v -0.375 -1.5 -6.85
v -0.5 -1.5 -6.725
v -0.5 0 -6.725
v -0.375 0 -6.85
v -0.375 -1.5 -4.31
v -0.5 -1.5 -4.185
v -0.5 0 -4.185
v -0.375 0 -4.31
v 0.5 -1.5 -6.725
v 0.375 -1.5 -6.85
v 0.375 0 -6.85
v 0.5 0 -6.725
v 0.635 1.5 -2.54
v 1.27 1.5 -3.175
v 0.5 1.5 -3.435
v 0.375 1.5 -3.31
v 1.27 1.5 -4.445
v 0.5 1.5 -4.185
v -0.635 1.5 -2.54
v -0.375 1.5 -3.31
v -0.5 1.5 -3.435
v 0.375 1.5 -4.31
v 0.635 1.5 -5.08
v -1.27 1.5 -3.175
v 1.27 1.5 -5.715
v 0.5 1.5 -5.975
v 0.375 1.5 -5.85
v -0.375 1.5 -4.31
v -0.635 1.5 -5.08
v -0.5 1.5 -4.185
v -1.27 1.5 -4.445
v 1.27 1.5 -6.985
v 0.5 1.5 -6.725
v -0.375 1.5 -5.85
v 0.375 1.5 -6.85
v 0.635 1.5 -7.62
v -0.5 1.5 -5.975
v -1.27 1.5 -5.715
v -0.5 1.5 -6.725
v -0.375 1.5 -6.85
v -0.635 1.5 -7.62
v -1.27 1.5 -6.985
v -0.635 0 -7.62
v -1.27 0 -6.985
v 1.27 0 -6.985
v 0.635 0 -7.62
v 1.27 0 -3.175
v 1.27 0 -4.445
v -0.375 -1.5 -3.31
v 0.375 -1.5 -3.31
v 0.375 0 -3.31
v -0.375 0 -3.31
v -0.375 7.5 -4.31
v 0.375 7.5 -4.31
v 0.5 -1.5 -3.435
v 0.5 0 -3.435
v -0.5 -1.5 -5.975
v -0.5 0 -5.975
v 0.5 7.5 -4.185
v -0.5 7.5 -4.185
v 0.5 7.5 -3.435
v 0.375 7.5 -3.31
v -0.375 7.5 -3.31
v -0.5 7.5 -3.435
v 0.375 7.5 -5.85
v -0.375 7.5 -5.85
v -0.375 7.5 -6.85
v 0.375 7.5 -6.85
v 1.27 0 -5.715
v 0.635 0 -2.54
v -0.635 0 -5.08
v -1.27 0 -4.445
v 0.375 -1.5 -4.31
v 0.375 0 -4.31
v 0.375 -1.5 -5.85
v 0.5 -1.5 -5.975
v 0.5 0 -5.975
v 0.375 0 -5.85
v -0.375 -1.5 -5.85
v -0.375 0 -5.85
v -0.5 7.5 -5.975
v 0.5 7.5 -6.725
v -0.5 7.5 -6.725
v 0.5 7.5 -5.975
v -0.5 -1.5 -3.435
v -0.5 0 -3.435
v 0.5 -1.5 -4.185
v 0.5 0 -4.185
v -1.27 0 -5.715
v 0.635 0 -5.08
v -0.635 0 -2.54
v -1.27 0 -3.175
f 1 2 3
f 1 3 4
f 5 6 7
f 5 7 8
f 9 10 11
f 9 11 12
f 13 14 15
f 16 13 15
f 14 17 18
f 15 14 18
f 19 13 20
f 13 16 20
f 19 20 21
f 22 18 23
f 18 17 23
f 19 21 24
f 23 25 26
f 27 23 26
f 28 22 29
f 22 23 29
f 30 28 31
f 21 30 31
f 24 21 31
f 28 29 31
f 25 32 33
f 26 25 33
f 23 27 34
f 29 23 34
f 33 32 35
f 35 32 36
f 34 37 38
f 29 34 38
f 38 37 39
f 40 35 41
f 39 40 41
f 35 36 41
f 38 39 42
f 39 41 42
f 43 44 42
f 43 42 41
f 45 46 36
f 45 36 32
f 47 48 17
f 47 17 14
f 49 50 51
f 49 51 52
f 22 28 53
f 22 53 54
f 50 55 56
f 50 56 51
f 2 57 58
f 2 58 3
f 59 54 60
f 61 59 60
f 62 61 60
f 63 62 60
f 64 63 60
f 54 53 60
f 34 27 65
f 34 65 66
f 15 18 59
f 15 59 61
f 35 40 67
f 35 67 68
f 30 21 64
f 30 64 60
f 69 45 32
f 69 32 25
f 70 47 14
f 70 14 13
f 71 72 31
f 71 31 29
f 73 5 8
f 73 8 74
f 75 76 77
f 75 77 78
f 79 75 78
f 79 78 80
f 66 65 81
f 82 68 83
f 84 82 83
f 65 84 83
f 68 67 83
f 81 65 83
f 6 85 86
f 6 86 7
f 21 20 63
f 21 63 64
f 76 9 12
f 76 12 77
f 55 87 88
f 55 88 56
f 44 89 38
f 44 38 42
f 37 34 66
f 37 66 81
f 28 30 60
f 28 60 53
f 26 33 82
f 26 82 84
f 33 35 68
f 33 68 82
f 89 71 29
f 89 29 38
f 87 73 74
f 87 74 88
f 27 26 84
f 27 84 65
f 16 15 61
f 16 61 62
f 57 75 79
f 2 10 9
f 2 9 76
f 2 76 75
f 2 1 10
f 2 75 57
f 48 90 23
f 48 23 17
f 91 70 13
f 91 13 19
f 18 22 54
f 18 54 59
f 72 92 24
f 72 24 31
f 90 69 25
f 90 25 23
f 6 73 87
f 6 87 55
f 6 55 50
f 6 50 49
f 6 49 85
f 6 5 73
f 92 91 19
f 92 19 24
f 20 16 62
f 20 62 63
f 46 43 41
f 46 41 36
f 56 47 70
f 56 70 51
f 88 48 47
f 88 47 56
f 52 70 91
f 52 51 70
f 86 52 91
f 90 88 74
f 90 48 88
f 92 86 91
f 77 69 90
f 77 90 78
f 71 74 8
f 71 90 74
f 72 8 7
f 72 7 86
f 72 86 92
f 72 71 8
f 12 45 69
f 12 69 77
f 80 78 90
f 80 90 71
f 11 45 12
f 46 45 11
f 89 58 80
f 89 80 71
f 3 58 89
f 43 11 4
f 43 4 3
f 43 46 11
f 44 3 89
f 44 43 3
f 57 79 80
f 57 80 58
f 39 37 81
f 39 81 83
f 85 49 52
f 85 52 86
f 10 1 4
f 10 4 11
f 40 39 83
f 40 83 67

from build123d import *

# Parameters (mm, degrees)
BOSS_EXTRUDE1_DEPTH      = 1.5
BOSS_EXTRUDE2_DEPTH      = 6
BOSS_EXTRUDE2_DEPTH_BACK = 3
CUT_EXTRUDE1_DEPTH       = 13.69206445
CUT_EXTRUDE1_DEPTH_BACK  = 13.69206445
CUT_EXTRUDE2_DEPTH       = 6
CUT_EXTRUDE2_DEPTH_BACK  = 6


with BuildPart() as part:
    # Sketch1 → Boss-Extrude1 (new body)
    with BuildSketch(Plane(origin=(0, 0, 0), x_dir=(1, 0, 0), z_dir=(0, 1, 0))):
        Polygon((-0.635, 10.16), (0.635, 10.16), (1.27, 9.525), (1.27, 8.255), (0.635, 7.62), (1.27, 6.985), (1.27, 5.715), (0.635, 5.08), (1.27, 4.445), (1.27, 3.175), (0.635, 2.54), (1.27, 1.905), (1.27, 0.635), (0.635, 0), (1.27, -0.635), (1.27, -1.905), (0.635, -2.54), (1.27, -3.175), (1.27, -4.445), (0.635, -5.08), (-0.635, -5.08), (-1.27, -4.445), (-1.27, -3.175), (-0.635, -2.54), (-1.27, -1.905), (-1.27, -0.635), (-0.635, 0), (-1.27, 0.635), (-1.27, 1.905), (-0.635, 2.54), (-1.27, 3.175), (-1.27, 4.445), (-0.635, 5.08), (-1.27, 5.715), (-1.27, 6.985), (-0.635, 7.62), (-1.27, 8.255), (-1.27, 9.525), align=None)
    extrude(amount=BOSS_EXTRUDE1_DEPTH)

    # Sketch3 → Boss-Extrude2 (add, two sides: drawn at the far end of the back side and taken through both)
    with BuildSketch(Plane(origin=(0, 1.5, 0), x_dir=(1, 0, 0), z_dir=(0, 1, 0)).offset(-BOSS_EXTRUDE2_DEPTH_BACK)):
        Polygon((0.375, 9.39), (0.5, 9.265), (0.5, 8.515), (0.375, 8.39), (-0.375, 8.39), (-0.5, 8.515), (-0.5, 9.265), (-0.375, 9.39), align=None)
        Polygon((0.375, 6.85), (0.5, 6.725), (0.5, 5.975), (0.375, 5.85), (-0.375, 5.85), (-0.5, 5.975), (-0.5, 6.725), (-0.375, 6.85), align=None)
        Polygon((0.375, 4.31), (0.5, 4.185), (0.5, 3.435), (0.375, 3.31), (-0.375, 3.31), (-0.5, 3.435), (-0.5, 4.185), (-0.375, 4.31), align=None)
        Polygon((0.375, 1.77), (0.5, 1.645), (0.5, 0.895), (0.375, 0.77), (-0.375, 0.77), (-0.5, 0.895), (-0.5, 1.645), (-0.375, 1.77), align=None)
        Polygon((0.375, -0.77), (0.5, -0.895), (0.5, -1.645), (0.375, -1.77), (-0.375, -1.77), (-0.5, -1.645), (-0.5, -0.895), (-0.375, -0.77), align=None)
        Polygon((0.375, -3.31), (0.5, -3.435), (0.5, -4.185), (0.375, -4.31), (-0.375, -4.31), (-0.5, -4.185), (-0.5, -3.435), (-0.375, -3.31), align=None)
    extrude(amount=BOSS_EXTRUDE2_DEPTH + BOSS_EXTRUDE2_DEPTH_BACK)

    # Sketch4 → Cut-Extrude1 (cut, two sides: drawn at the far end of the back side and taken through both)
    with BuildSketch(Plane(origin=(0, 0, 0), x_dir=(1, 0, 0), z_dir=(0, 1, 0)).offset(-CUT_EXTRUDE1_DEPTH_BACK)):
        Polygon((0.635, 2.54), (-0.635, 2.54), (-3.551273802, 2.145414022), (-3.551273802, -5.54901255), (3.518391637, -6.305302341), (3.518391637, 1.323359901), align=None)
    extrude(amount=CUT_EXTRUDE1_DEPTH + CUT_EXTRUDE1_DEPTH_BACK, mode=Mode.SUBTRACT)

    # Sketch5 → Cut-Extrude2 (cut, two sides: drawn at the far end of the back side and taken through both)
    with BuildSketch(Plane(origin=(0, 1.5, 0), x_dir=(1, 0, 0), z_dir=(0, 1, 0)).offset(-CUT_EXTRUDE2_DEPTH_BACK)):
        Polygon((-0.635, 7.62), (0.635, 7.62), (3.304657566, 8.536663962), (1.969828783, 11.132382054), (-2.565180809, 11.132382054), (-2.565180809, 10.824604991), (-2.565180809, 7.895726944), align=None)
    extrude(amount=CUT_EXTRUDE2_DEPTH + CUT_EXTRUDE2_DEPTH_BACK, mode=Mode.SUBTRACT)


solid = part.part
